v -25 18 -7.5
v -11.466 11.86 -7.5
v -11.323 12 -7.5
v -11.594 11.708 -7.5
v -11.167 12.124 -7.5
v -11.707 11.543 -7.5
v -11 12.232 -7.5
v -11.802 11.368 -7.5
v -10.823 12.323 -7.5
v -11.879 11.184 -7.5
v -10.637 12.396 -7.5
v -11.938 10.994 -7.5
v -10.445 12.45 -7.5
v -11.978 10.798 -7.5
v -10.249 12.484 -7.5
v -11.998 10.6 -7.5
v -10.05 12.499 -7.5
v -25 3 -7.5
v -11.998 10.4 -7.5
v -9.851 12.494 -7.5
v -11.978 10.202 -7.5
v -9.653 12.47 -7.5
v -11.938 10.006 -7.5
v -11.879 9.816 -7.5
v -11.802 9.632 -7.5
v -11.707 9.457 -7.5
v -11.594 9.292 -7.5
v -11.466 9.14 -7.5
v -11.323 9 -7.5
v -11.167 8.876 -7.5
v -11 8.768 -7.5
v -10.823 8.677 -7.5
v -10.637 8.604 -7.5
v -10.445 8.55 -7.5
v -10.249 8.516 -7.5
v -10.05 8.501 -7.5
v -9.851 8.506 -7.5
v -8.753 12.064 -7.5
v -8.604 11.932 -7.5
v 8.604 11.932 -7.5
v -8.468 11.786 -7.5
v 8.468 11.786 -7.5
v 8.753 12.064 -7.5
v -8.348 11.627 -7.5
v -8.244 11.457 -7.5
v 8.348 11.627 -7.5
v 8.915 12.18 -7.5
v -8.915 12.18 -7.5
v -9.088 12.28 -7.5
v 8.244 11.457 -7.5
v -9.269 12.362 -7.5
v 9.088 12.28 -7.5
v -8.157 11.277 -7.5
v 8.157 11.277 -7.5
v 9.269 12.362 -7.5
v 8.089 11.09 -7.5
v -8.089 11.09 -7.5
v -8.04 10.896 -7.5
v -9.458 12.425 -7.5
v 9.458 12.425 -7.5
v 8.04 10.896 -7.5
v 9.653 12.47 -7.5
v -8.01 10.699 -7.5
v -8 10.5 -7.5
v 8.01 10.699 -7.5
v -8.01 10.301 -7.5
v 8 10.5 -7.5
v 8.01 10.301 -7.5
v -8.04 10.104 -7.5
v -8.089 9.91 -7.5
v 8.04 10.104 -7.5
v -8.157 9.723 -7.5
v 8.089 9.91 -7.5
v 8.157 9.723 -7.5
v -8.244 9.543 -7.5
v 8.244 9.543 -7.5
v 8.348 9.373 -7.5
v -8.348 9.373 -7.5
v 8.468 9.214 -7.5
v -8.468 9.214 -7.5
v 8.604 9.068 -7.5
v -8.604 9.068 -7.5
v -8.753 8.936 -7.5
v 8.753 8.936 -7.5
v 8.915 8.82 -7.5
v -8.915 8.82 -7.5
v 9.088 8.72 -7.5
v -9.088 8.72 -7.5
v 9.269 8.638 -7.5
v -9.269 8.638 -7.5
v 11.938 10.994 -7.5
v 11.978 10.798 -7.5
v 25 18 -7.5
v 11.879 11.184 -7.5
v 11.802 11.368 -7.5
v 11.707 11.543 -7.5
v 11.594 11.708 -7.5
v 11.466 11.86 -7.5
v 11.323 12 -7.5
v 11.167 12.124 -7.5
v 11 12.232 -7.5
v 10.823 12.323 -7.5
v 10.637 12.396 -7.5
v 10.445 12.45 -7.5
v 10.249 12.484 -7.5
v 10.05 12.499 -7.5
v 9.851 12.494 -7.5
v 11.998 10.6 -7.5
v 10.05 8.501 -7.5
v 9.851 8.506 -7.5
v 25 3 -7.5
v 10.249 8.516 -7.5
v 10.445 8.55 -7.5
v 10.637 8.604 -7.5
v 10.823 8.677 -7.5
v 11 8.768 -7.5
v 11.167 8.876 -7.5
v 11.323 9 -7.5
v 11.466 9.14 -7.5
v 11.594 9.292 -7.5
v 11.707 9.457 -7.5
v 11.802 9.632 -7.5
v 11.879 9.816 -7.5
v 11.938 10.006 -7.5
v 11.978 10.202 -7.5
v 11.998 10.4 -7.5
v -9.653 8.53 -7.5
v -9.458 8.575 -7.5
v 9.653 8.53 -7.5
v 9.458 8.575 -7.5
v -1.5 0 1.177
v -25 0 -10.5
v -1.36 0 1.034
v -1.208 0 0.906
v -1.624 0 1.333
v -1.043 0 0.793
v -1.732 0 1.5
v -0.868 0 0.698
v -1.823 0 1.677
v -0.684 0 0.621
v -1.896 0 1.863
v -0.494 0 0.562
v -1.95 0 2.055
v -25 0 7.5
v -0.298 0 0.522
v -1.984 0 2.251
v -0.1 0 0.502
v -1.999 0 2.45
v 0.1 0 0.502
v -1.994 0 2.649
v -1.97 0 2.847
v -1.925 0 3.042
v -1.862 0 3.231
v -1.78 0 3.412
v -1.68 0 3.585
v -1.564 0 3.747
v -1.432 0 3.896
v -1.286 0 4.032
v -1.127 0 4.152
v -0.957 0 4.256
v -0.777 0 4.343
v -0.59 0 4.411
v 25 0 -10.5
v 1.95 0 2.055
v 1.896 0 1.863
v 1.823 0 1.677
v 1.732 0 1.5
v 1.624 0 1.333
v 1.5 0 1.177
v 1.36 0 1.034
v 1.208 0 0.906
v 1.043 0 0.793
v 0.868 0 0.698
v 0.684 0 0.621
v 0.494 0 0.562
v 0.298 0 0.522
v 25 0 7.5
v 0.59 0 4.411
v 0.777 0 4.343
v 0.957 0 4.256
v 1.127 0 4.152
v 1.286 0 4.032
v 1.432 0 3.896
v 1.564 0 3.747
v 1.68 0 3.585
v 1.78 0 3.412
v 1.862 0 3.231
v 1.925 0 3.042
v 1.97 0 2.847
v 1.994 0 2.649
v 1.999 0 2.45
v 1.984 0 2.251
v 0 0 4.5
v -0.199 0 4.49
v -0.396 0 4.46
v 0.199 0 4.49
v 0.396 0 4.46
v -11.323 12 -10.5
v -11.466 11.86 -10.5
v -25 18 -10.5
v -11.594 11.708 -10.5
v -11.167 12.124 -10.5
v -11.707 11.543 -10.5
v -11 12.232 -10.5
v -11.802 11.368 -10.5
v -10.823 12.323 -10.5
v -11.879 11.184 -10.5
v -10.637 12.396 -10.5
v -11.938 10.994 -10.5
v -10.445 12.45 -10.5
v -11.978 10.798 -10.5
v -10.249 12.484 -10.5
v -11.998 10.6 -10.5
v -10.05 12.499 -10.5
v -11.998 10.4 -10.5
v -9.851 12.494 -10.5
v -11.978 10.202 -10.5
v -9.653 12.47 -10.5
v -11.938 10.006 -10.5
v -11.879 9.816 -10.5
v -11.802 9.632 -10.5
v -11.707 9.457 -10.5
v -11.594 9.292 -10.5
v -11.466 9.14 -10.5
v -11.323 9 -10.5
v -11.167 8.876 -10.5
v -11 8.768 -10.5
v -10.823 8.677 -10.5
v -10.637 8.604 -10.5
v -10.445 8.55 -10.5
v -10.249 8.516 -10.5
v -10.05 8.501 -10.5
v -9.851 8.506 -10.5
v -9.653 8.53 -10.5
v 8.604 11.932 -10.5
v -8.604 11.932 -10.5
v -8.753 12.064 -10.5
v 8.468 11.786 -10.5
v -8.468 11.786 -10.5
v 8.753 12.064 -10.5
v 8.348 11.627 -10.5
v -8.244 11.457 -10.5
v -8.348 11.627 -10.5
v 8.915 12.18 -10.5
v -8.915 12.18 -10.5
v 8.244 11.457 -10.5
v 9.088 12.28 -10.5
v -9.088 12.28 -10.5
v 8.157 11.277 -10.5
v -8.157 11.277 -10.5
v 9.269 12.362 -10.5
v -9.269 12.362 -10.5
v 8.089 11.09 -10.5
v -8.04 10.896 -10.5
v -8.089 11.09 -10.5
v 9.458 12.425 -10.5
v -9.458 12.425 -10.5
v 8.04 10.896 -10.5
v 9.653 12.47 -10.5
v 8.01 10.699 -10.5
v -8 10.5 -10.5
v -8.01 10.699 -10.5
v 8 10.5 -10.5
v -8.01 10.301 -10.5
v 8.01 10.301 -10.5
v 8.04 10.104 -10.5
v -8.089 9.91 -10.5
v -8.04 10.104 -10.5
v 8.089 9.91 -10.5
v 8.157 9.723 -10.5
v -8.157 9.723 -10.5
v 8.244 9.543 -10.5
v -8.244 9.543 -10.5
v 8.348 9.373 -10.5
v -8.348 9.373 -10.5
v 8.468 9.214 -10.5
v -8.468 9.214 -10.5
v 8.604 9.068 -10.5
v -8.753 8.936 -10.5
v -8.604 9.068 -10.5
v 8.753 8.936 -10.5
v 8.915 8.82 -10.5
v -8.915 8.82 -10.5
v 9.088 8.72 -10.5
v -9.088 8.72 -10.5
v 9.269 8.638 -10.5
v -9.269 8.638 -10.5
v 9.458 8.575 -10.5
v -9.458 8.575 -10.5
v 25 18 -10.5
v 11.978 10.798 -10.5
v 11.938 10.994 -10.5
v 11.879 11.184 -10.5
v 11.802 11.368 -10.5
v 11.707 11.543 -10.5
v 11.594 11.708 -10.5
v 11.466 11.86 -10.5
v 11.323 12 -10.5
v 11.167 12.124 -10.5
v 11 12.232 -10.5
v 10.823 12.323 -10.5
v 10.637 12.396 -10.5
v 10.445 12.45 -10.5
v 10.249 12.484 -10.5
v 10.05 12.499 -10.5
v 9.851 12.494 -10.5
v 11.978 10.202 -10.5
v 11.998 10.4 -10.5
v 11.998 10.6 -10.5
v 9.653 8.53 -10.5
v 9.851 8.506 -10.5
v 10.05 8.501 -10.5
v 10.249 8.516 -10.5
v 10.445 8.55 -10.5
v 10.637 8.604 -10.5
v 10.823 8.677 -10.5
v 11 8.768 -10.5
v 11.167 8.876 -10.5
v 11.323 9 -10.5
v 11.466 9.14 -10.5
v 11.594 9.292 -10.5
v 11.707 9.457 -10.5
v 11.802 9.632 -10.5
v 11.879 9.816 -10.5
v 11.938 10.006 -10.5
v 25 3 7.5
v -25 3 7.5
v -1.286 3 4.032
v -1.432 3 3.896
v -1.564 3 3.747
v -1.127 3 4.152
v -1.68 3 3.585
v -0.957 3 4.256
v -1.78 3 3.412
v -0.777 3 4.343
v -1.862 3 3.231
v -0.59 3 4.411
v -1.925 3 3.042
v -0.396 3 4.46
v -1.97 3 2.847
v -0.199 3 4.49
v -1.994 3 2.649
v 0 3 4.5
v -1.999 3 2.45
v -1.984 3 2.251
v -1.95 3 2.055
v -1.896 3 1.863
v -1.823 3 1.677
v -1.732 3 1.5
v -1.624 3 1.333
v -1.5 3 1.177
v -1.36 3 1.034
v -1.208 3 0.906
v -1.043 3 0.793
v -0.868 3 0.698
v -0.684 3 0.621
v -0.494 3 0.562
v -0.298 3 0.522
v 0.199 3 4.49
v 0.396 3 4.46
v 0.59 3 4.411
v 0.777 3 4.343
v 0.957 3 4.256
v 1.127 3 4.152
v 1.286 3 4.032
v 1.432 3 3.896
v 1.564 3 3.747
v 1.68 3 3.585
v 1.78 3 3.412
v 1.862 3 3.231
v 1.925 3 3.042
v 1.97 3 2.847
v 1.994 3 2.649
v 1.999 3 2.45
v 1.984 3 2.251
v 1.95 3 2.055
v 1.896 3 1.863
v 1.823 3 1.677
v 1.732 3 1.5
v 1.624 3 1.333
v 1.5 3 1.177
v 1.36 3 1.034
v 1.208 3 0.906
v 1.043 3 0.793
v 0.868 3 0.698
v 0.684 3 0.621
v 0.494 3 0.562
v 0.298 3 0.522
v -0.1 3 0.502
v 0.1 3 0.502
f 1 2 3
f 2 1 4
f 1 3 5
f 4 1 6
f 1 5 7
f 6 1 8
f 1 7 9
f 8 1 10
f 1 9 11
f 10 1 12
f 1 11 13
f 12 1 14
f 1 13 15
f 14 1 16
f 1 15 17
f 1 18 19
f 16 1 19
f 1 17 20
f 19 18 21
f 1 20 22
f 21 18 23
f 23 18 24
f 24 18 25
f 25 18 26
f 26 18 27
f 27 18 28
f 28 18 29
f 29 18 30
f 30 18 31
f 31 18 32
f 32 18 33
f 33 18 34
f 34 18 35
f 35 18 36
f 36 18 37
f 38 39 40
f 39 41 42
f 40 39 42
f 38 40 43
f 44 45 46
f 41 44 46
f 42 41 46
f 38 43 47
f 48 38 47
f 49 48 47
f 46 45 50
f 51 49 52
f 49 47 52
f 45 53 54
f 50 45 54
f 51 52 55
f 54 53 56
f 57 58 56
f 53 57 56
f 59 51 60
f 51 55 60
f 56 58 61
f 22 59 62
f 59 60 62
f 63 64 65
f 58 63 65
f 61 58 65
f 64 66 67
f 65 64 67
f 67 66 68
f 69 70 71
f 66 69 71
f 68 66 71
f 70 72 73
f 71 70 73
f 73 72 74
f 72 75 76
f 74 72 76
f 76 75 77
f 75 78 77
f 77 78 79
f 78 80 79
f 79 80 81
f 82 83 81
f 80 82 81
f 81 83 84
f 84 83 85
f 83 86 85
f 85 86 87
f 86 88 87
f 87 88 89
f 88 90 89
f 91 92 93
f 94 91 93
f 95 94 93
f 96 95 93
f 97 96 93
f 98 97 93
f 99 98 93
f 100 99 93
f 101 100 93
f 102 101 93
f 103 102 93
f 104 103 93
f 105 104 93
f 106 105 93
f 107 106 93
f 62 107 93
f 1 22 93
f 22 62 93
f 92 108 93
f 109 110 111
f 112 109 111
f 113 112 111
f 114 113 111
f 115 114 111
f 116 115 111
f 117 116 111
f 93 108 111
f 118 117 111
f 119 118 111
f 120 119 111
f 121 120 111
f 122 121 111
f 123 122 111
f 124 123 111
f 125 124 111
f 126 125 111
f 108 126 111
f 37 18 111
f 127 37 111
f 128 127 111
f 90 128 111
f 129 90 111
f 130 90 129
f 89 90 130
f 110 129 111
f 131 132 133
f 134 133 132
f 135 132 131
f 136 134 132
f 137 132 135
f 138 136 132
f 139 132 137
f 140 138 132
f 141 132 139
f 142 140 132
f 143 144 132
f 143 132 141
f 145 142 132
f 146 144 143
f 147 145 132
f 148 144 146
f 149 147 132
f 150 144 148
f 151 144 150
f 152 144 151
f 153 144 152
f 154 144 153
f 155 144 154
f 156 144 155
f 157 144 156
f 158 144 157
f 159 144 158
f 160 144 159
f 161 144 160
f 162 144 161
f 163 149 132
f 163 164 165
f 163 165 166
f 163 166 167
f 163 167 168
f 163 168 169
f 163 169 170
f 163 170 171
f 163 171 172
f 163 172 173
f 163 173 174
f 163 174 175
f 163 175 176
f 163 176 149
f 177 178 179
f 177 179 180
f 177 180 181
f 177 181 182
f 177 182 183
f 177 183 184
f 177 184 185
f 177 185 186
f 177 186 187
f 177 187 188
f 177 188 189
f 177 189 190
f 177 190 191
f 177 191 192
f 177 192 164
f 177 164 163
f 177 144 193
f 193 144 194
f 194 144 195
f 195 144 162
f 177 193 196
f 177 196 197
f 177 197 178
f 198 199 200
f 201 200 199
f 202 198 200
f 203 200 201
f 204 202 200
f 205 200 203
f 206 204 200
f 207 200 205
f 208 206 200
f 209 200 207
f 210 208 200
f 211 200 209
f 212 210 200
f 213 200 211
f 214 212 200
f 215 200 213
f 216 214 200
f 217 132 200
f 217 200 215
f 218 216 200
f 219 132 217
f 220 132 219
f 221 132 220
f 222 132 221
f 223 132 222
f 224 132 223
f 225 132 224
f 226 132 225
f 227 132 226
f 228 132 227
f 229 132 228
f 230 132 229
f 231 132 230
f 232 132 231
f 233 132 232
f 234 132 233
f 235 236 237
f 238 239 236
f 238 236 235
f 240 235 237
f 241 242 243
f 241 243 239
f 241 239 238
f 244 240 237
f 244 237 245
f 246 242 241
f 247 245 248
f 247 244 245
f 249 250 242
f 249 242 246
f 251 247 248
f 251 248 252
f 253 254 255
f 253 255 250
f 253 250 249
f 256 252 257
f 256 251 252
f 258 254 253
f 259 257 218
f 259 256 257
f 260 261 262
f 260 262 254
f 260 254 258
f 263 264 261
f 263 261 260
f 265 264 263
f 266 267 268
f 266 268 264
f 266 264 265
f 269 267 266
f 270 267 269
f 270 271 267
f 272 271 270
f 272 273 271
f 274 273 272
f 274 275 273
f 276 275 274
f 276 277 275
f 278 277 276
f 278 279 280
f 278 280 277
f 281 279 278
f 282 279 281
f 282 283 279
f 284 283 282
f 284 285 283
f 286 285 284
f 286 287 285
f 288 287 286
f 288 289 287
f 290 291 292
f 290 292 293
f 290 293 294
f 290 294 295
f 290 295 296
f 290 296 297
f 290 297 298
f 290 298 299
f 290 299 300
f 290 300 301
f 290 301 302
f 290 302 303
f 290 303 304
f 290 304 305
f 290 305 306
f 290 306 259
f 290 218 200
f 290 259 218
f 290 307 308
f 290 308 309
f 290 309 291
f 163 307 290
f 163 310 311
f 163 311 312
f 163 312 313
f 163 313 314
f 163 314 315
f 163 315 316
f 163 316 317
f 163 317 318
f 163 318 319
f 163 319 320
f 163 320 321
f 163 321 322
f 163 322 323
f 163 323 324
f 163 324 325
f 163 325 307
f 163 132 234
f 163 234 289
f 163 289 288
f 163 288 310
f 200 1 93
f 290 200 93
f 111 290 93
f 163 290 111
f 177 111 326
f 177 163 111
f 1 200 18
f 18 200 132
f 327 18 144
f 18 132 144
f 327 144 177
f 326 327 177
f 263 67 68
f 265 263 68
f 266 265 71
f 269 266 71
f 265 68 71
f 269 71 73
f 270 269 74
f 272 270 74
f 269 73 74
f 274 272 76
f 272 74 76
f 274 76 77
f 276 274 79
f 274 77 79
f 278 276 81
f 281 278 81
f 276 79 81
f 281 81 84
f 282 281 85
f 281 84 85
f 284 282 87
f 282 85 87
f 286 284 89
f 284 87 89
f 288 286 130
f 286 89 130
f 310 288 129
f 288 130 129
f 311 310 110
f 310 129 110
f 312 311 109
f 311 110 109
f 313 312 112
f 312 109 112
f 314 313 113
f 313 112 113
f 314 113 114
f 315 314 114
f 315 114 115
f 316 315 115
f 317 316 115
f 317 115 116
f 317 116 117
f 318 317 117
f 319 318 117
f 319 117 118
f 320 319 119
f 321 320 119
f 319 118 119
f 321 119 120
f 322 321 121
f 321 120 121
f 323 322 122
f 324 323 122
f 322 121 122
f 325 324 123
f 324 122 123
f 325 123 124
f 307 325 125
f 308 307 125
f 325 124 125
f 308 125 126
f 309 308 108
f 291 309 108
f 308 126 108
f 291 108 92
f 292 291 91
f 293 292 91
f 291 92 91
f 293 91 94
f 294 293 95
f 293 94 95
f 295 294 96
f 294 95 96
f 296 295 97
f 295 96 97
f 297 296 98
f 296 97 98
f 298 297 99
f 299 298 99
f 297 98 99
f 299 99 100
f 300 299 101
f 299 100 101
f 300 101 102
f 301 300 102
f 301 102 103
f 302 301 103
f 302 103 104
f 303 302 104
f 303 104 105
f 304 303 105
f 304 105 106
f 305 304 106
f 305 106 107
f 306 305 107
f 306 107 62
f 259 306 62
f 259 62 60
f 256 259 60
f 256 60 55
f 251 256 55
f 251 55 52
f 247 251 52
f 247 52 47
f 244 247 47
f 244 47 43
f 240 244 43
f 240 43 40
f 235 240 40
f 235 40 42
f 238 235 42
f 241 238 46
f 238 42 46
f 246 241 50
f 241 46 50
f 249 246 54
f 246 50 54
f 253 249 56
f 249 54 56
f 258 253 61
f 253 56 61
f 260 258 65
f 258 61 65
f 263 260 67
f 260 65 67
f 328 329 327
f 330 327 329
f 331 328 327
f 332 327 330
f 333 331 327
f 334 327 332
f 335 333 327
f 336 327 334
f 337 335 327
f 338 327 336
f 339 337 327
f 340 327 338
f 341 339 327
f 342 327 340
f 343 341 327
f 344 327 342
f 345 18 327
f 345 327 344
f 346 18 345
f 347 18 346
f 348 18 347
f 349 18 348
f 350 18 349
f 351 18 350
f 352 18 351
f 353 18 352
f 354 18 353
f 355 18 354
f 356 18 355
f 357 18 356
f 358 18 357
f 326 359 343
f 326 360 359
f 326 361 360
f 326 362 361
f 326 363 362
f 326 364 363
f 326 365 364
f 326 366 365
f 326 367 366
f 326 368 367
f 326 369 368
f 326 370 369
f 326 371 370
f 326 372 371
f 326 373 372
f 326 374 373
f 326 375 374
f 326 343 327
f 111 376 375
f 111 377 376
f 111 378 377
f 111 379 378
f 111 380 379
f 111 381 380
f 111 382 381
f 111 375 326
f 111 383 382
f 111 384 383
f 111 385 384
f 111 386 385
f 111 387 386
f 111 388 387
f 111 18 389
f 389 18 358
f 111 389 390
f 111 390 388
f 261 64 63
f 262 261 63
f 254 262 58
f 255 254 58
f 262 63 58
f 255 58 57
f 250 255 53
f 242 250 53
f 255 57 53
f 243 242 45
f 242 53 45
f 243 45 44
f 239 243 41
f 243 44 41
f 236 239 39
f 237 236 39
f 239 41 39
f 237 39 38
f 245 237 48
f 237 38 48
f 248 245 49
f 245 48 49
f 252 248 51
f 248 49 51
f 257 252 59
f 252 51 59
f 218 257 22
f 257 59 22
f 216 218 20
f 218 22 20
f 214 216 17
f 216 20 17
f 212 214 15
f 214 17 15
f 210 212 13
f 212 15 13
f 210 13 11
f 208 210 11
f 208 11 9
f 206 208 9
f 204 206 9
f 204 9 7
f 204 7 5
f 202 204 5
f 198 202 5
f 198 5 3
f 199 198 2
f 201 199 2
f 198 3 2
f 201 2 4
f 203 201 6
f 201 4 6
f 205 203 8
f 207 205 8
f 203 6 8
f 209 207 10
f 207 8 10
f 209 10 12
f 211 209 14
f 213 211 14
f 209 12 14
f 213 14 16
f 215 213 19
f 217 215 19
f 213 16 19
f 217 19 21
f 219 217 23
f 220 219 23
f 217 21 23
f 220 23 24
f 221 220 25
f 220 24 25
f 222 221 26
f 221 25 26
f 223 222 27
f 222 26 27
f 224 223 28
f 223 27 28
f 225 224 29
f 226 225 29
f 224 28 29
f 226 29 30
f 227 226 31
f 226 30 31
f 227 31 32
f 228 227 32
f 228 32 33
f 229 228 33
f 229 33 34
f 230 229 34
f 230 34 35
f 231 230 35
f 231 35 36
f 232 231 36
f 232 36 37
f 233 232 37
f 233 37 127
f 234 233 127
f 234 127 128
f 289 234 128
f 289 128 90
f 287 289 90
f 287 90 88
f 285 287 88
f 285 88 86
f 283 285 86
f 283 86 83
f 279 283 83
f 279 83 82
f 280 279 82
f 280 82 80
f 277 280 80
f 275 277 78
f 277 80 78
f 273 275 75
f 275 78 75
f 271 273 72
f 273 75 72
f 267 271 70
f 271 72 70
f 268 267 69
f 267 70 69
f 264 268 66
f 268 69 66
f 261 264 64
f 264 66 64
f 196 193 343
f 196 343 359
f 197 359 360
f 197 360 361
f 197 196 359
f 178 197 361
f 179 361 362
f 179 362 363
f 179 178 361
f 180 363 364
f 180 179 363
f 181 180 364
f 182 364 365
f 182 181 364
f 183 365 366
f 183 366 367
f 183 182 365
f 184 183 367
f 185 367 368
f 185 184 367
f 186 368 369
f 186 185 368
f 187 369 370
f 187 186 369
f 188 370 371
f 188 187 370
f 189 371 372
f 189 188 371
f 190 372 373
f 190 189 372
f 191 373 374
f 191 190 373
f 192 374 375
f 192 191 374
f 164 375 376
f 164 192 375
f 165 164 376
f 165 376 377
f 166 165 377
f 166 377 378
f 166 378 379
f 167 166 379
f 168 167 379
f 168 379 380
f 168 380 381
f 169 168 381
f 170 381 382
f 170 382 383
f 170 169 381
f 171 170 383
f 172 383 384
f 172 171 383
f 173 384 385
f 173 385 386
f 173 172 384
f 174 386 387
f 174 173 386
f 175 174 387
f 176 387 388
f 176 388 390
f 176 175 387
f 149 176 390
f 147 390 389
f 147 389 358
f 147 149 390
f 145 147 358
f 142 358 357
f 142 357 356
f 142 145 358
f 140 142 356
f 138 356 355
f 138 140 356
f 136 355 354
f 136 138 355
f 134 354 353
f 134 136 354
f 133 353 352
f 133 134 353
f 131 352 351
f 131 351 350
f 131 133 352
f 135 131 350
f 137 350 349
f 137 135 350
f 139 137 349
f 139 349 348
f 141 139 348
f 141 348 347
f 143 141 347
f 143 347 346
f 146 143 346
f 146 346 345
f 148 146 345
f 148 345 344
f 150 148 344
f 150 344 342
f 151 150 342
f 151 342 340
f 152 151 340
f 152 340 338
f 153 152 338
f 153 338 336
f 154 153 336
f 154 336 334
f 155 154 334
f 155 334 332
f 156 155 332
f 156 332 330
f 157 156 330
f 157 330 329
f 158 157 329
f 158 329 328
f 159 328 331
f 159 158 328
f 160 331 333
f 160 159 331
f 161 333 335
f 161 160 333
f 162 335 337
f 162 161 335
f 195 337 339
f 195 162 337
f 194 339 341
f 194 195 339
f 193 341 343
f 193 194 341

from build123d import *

# Parameters (mm, degrees)
SKETCH1_W           = 50
SKETCH1_H           = 15
SKETCH1_R           = 2
BOSS_EXTRUDE1_DEPTH = 3
SKETCH2_W           = 50
SKETCH2_H           = 3
BOSS_EXTRUDE2_DEPTH = 18
SKETCH3_R           = 2
CUT_EXTRUDE1_DEPTH  = 3


with BuildPart() as part:
    # Sketch1 → Boss-Extrude1 (new body)
    with BuildSketch(Plane(origin=(0, 0, 0), x_dir=(1, 0, 0), z_dir=(0, 1, 0))):
        Rectangle(SKETCH1_W, SKETCH1_H)
        with Locations(Location((0, -2.5, 0), (0, 0, 270))):
            Circle(SKETCH1_R, mode=Mode.SUBTRACT)
    extrude(amount=BOSS_EXTRUDE1_DEPTH)

    # Sketch2 → Boss-Extrude2 (add)
    with BuildSketch(Plane.XZ):
        with Locations((0, -9)):
            Rectangle(SKETCH2_W, SKETCH2_H)
    extrude(amount=-BOSS_EXTRUDE2_DEPTH)

    # Sketch3 → Cut-Extrude1 (cut)
    with BuildSketch(Plane.XY.offset(-7.5)):
        with Locations((-10, 10.5)):
            Circle(SKETCH3_R)
        with Locations(Location((10, 10.5, 0), (0, 0, 180))):
            Circle(SKETCH3_R)
    extrude(amount=-CUT_EXTRUDE1_DEPTH, mode=Mode.SUBTRACT)


solid = part.part
